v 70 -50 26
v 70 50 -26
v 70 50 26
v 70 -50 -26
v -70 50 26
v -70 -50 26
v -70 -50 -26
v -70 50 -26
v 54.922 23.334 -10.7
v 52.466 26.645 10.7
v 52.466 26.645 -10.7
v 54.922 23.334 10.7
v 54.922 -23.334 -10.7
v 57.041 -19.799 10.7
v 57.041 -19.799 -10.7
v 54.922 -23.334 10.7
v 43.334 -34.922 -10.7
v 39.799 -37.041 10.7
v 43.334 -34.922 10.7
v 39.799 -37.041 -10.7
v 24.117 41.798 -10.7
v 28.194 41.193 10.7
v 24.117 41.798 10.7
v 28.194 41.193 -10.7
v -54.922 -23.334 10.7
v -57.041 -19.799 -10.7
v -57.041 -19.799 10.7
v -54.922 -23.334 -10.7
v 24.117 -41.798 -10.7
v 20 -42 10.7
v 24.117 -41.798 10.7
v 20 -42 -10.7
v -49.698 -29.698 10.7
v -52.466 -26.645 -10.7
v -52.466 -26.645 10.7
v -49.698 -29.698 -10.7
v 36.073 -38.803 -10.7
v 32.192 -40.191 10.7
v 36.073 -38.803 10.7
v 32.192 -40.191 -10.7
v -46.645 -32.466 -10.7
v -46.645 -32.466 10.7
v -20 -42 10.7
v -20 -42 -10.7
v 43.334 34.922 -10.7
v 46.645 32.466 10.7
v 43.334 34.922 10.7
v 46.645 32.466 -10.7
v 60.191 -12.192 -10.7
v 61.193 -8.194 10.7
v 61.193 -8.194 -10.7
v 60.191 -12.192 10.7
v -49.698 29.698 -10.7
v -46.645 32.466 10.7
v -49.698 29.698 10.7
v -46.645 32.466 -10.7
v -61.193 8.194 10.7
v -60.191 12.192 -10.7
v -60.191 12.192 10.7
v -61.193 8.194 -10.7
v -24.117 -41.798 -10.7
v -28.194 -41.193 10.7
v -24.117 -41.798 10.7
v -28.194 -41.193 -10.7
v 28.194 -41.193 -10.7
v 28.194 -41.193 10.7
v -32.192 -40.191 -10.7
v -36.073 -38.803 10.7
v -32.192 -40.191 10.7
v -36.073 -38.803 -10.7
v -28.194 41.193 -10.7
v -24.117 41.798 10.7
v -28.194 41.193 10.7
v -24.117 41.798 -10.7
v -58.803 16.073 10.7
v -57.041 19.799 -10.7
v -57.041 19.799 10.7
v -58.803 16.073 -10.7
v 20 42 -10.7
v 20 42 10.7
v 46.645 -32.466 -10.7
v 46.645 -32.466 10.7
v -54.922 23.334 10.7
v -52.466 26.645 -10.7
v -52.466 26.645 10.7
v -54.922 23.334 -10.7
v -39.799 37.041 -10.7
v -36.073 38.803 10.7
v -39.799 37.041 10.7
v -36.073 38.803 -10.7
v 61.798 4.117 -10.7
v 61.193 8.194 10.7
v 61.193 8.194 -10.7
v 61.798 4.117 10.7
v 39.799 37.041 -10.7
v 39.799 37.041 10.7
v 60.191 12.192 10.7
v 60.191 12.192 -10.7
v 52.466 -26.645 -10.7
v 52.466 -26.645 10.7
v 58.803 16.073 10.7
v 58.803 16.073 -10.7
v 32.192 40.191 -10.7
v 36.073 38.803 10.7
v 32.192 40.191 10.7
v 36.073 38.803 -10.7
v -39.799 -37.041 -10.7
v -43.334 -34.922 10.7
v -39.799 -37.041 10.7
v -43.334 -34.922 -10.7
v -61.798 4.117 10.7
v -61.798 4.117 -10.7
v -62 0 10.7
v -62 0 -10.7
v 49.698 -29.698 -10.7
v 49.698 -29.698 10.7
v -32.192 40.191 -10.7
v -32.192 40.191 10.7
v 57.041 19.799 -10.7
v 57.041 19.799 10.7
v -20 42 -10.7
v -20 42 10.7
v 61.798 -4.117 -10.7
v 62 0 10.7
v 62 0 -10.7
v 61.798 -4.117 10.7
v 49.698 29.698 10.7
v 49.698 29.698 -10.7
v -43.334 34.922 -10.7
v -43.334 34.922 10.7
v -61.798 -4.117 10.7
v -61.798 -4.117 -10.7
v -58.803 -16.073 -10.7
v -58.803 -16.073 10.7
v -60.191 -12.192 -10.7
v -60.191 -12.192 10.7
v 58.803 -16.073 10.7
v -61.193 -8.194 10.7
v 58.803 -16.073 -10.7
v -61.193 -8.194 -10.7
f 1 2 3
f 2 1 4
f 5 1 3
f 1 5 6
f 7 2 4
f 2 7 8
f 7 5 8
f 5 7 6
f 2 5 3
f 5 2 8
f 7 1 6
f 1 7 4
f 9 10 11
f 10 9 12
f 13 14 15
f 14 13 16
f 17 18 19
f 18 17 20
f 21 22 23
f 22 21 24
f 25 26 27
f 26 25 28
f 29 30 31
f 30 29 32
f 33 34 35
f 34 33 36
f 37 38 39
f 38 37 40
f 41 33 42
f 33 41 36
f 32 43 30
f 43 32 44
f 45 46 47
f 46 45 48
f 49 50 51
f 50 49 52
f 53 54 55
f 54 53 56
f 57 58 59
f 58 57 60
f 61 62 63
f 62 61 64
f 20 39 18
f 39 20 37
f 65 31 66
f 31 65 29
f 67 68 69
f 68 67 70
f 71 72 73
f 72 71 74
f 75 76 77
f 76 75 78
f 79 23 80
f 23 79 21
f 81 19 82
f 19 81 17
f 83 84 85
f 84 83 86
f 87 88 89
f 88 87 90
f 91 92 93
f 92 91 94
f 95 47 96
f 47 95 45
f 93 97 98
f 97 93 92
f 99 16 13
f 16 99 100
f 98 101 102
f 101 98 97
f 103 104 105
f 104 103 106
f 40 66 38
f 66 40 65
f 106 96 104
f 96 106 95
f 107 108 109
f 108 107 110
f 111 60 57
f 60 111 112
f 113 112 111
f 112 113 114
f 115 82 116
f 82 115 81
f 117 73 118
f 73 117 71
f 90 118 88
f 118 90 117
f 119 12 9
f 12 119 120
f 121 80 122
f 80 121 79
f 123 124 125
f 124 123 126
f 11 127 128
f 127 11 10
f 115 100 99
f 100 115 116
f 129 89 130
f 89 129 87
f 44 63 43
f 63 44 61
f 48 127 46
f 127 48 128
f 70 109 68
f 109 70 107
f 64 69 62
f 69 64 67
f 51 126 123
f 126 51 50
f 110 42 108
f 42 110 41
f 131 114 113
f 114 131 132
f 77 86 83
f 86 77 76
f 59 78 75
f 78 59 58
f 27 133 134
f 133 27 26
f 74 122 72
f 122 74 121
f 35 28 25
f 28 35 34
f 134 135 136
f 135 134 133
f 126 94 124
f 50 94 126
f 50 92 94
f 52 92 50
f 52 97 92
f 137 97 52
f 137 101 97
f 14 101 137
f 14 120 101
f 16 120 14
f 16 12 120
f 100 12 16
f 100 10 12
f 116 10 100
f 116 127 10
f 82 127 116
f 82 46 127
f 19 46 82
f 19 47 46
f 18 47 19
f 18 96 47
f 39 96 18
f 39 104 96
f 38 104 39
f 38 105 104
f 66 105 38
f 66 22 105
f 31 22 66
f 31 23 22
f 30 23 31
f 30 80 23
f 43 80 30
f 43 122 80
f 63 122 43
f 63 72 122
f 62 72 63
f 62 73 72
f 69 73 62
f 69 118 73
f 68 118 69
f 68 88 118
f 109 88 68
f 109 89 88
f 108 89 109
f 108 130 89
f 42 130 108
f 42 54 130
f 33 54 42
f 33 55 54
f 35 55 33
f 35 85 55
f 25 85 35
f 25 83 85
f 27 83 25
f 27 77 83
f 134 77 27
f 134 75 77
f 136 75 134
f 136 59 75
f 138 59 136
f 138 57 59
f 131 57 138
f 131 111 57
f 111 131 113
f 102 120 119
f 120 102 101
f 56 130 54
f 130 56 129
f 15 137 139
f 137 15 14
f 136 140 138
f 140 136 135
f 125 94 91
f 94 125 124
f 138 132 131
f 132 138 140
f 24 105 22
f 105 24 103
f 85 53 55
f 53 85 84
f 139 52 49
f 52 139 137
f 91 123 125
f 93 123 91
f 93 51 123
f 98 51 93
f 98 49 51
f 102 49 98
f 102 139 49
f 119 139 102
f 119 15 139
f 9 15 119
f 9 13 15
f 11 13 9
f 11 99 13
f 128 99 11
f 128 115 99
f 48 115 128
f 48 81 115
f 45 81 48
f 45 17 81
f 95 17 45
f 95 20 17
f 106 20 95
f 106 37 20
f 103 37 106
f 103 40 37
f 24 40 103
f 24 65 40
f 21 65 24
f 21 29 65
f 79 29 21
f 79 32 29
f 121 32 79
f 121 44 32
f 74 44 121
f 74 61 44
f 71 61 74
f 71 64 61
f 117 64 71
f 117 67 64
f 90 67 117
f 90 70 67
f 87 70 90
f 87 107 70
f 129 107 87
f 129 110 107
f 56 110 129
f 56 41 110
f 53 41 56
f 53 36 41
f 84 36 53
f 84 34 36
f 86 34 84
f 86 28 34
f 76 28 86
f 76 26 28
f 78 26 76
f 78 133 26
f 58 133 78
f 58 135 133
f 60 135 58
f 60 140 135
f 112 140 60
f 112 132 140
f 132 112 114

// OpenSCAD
// ============================================================================
// Atom Lithography Machine — Parametric OpenSCAD Module (S9.1-02)
// ============================================================================
// part_id           : S9.1-02
// parent_bom_id     : S9.1
// subsystem         : S9
// part_name         : Demet nokta boyutu (knife-edge) ve litografik fiducial kalibrasyon hedefleri
// material          : Si
// temp_stage        : 300 K
// vacuum_grade      : UHV 1e-9 mbar
// tolerance         : ±1 nm kenar
// computed_mass_kg  : 1.15000
// envelope_mm       : 168.800 x 116.400 x 52.000
// design_maturity   : M0_M1_DETAILED_CAD_DESIGN_ONLY
// no_lab_measurement: true
// iec61508_certified: false
// semi_s2_certified : false
// Units: millimeters (mm)
// ============================================================================

$fn = 64;

// Nominal bounding envelope parameters (mm)
bbox_x = 168.8000;
bbox_y = 116.4000;
bbox_z = 52.0000;

// Part-specific parametric dimensions
qty_targets = 4;
coupon_sq_mm = 25.0;
edge_nm = 10.0;

// Interface / port parameters (mm)

module part_S9_1_02() {
  difference() {
    union() {
      // Cleanroom ESD storage case outer envelope
      cube([140.000, 100.000, 52.000], center=true);
    }
    // Internal padded kit tray cavity
    hull() {
      translate([-20.000, 0, 0]) cylinder(d=84.000, h=21.400, center=true);
      translate([20.000, 0, 0]) cylinder(d=84.000, h=21.400, center=true);
    }
  }
}

// World assembly mounting transform (global machine frame, mm / deg):
// translate([-710.000, -1180.000, 26.000]) rotate([0.000, 0.000, 0.000]) part_S9_1_02();

part_S9_1_02();
